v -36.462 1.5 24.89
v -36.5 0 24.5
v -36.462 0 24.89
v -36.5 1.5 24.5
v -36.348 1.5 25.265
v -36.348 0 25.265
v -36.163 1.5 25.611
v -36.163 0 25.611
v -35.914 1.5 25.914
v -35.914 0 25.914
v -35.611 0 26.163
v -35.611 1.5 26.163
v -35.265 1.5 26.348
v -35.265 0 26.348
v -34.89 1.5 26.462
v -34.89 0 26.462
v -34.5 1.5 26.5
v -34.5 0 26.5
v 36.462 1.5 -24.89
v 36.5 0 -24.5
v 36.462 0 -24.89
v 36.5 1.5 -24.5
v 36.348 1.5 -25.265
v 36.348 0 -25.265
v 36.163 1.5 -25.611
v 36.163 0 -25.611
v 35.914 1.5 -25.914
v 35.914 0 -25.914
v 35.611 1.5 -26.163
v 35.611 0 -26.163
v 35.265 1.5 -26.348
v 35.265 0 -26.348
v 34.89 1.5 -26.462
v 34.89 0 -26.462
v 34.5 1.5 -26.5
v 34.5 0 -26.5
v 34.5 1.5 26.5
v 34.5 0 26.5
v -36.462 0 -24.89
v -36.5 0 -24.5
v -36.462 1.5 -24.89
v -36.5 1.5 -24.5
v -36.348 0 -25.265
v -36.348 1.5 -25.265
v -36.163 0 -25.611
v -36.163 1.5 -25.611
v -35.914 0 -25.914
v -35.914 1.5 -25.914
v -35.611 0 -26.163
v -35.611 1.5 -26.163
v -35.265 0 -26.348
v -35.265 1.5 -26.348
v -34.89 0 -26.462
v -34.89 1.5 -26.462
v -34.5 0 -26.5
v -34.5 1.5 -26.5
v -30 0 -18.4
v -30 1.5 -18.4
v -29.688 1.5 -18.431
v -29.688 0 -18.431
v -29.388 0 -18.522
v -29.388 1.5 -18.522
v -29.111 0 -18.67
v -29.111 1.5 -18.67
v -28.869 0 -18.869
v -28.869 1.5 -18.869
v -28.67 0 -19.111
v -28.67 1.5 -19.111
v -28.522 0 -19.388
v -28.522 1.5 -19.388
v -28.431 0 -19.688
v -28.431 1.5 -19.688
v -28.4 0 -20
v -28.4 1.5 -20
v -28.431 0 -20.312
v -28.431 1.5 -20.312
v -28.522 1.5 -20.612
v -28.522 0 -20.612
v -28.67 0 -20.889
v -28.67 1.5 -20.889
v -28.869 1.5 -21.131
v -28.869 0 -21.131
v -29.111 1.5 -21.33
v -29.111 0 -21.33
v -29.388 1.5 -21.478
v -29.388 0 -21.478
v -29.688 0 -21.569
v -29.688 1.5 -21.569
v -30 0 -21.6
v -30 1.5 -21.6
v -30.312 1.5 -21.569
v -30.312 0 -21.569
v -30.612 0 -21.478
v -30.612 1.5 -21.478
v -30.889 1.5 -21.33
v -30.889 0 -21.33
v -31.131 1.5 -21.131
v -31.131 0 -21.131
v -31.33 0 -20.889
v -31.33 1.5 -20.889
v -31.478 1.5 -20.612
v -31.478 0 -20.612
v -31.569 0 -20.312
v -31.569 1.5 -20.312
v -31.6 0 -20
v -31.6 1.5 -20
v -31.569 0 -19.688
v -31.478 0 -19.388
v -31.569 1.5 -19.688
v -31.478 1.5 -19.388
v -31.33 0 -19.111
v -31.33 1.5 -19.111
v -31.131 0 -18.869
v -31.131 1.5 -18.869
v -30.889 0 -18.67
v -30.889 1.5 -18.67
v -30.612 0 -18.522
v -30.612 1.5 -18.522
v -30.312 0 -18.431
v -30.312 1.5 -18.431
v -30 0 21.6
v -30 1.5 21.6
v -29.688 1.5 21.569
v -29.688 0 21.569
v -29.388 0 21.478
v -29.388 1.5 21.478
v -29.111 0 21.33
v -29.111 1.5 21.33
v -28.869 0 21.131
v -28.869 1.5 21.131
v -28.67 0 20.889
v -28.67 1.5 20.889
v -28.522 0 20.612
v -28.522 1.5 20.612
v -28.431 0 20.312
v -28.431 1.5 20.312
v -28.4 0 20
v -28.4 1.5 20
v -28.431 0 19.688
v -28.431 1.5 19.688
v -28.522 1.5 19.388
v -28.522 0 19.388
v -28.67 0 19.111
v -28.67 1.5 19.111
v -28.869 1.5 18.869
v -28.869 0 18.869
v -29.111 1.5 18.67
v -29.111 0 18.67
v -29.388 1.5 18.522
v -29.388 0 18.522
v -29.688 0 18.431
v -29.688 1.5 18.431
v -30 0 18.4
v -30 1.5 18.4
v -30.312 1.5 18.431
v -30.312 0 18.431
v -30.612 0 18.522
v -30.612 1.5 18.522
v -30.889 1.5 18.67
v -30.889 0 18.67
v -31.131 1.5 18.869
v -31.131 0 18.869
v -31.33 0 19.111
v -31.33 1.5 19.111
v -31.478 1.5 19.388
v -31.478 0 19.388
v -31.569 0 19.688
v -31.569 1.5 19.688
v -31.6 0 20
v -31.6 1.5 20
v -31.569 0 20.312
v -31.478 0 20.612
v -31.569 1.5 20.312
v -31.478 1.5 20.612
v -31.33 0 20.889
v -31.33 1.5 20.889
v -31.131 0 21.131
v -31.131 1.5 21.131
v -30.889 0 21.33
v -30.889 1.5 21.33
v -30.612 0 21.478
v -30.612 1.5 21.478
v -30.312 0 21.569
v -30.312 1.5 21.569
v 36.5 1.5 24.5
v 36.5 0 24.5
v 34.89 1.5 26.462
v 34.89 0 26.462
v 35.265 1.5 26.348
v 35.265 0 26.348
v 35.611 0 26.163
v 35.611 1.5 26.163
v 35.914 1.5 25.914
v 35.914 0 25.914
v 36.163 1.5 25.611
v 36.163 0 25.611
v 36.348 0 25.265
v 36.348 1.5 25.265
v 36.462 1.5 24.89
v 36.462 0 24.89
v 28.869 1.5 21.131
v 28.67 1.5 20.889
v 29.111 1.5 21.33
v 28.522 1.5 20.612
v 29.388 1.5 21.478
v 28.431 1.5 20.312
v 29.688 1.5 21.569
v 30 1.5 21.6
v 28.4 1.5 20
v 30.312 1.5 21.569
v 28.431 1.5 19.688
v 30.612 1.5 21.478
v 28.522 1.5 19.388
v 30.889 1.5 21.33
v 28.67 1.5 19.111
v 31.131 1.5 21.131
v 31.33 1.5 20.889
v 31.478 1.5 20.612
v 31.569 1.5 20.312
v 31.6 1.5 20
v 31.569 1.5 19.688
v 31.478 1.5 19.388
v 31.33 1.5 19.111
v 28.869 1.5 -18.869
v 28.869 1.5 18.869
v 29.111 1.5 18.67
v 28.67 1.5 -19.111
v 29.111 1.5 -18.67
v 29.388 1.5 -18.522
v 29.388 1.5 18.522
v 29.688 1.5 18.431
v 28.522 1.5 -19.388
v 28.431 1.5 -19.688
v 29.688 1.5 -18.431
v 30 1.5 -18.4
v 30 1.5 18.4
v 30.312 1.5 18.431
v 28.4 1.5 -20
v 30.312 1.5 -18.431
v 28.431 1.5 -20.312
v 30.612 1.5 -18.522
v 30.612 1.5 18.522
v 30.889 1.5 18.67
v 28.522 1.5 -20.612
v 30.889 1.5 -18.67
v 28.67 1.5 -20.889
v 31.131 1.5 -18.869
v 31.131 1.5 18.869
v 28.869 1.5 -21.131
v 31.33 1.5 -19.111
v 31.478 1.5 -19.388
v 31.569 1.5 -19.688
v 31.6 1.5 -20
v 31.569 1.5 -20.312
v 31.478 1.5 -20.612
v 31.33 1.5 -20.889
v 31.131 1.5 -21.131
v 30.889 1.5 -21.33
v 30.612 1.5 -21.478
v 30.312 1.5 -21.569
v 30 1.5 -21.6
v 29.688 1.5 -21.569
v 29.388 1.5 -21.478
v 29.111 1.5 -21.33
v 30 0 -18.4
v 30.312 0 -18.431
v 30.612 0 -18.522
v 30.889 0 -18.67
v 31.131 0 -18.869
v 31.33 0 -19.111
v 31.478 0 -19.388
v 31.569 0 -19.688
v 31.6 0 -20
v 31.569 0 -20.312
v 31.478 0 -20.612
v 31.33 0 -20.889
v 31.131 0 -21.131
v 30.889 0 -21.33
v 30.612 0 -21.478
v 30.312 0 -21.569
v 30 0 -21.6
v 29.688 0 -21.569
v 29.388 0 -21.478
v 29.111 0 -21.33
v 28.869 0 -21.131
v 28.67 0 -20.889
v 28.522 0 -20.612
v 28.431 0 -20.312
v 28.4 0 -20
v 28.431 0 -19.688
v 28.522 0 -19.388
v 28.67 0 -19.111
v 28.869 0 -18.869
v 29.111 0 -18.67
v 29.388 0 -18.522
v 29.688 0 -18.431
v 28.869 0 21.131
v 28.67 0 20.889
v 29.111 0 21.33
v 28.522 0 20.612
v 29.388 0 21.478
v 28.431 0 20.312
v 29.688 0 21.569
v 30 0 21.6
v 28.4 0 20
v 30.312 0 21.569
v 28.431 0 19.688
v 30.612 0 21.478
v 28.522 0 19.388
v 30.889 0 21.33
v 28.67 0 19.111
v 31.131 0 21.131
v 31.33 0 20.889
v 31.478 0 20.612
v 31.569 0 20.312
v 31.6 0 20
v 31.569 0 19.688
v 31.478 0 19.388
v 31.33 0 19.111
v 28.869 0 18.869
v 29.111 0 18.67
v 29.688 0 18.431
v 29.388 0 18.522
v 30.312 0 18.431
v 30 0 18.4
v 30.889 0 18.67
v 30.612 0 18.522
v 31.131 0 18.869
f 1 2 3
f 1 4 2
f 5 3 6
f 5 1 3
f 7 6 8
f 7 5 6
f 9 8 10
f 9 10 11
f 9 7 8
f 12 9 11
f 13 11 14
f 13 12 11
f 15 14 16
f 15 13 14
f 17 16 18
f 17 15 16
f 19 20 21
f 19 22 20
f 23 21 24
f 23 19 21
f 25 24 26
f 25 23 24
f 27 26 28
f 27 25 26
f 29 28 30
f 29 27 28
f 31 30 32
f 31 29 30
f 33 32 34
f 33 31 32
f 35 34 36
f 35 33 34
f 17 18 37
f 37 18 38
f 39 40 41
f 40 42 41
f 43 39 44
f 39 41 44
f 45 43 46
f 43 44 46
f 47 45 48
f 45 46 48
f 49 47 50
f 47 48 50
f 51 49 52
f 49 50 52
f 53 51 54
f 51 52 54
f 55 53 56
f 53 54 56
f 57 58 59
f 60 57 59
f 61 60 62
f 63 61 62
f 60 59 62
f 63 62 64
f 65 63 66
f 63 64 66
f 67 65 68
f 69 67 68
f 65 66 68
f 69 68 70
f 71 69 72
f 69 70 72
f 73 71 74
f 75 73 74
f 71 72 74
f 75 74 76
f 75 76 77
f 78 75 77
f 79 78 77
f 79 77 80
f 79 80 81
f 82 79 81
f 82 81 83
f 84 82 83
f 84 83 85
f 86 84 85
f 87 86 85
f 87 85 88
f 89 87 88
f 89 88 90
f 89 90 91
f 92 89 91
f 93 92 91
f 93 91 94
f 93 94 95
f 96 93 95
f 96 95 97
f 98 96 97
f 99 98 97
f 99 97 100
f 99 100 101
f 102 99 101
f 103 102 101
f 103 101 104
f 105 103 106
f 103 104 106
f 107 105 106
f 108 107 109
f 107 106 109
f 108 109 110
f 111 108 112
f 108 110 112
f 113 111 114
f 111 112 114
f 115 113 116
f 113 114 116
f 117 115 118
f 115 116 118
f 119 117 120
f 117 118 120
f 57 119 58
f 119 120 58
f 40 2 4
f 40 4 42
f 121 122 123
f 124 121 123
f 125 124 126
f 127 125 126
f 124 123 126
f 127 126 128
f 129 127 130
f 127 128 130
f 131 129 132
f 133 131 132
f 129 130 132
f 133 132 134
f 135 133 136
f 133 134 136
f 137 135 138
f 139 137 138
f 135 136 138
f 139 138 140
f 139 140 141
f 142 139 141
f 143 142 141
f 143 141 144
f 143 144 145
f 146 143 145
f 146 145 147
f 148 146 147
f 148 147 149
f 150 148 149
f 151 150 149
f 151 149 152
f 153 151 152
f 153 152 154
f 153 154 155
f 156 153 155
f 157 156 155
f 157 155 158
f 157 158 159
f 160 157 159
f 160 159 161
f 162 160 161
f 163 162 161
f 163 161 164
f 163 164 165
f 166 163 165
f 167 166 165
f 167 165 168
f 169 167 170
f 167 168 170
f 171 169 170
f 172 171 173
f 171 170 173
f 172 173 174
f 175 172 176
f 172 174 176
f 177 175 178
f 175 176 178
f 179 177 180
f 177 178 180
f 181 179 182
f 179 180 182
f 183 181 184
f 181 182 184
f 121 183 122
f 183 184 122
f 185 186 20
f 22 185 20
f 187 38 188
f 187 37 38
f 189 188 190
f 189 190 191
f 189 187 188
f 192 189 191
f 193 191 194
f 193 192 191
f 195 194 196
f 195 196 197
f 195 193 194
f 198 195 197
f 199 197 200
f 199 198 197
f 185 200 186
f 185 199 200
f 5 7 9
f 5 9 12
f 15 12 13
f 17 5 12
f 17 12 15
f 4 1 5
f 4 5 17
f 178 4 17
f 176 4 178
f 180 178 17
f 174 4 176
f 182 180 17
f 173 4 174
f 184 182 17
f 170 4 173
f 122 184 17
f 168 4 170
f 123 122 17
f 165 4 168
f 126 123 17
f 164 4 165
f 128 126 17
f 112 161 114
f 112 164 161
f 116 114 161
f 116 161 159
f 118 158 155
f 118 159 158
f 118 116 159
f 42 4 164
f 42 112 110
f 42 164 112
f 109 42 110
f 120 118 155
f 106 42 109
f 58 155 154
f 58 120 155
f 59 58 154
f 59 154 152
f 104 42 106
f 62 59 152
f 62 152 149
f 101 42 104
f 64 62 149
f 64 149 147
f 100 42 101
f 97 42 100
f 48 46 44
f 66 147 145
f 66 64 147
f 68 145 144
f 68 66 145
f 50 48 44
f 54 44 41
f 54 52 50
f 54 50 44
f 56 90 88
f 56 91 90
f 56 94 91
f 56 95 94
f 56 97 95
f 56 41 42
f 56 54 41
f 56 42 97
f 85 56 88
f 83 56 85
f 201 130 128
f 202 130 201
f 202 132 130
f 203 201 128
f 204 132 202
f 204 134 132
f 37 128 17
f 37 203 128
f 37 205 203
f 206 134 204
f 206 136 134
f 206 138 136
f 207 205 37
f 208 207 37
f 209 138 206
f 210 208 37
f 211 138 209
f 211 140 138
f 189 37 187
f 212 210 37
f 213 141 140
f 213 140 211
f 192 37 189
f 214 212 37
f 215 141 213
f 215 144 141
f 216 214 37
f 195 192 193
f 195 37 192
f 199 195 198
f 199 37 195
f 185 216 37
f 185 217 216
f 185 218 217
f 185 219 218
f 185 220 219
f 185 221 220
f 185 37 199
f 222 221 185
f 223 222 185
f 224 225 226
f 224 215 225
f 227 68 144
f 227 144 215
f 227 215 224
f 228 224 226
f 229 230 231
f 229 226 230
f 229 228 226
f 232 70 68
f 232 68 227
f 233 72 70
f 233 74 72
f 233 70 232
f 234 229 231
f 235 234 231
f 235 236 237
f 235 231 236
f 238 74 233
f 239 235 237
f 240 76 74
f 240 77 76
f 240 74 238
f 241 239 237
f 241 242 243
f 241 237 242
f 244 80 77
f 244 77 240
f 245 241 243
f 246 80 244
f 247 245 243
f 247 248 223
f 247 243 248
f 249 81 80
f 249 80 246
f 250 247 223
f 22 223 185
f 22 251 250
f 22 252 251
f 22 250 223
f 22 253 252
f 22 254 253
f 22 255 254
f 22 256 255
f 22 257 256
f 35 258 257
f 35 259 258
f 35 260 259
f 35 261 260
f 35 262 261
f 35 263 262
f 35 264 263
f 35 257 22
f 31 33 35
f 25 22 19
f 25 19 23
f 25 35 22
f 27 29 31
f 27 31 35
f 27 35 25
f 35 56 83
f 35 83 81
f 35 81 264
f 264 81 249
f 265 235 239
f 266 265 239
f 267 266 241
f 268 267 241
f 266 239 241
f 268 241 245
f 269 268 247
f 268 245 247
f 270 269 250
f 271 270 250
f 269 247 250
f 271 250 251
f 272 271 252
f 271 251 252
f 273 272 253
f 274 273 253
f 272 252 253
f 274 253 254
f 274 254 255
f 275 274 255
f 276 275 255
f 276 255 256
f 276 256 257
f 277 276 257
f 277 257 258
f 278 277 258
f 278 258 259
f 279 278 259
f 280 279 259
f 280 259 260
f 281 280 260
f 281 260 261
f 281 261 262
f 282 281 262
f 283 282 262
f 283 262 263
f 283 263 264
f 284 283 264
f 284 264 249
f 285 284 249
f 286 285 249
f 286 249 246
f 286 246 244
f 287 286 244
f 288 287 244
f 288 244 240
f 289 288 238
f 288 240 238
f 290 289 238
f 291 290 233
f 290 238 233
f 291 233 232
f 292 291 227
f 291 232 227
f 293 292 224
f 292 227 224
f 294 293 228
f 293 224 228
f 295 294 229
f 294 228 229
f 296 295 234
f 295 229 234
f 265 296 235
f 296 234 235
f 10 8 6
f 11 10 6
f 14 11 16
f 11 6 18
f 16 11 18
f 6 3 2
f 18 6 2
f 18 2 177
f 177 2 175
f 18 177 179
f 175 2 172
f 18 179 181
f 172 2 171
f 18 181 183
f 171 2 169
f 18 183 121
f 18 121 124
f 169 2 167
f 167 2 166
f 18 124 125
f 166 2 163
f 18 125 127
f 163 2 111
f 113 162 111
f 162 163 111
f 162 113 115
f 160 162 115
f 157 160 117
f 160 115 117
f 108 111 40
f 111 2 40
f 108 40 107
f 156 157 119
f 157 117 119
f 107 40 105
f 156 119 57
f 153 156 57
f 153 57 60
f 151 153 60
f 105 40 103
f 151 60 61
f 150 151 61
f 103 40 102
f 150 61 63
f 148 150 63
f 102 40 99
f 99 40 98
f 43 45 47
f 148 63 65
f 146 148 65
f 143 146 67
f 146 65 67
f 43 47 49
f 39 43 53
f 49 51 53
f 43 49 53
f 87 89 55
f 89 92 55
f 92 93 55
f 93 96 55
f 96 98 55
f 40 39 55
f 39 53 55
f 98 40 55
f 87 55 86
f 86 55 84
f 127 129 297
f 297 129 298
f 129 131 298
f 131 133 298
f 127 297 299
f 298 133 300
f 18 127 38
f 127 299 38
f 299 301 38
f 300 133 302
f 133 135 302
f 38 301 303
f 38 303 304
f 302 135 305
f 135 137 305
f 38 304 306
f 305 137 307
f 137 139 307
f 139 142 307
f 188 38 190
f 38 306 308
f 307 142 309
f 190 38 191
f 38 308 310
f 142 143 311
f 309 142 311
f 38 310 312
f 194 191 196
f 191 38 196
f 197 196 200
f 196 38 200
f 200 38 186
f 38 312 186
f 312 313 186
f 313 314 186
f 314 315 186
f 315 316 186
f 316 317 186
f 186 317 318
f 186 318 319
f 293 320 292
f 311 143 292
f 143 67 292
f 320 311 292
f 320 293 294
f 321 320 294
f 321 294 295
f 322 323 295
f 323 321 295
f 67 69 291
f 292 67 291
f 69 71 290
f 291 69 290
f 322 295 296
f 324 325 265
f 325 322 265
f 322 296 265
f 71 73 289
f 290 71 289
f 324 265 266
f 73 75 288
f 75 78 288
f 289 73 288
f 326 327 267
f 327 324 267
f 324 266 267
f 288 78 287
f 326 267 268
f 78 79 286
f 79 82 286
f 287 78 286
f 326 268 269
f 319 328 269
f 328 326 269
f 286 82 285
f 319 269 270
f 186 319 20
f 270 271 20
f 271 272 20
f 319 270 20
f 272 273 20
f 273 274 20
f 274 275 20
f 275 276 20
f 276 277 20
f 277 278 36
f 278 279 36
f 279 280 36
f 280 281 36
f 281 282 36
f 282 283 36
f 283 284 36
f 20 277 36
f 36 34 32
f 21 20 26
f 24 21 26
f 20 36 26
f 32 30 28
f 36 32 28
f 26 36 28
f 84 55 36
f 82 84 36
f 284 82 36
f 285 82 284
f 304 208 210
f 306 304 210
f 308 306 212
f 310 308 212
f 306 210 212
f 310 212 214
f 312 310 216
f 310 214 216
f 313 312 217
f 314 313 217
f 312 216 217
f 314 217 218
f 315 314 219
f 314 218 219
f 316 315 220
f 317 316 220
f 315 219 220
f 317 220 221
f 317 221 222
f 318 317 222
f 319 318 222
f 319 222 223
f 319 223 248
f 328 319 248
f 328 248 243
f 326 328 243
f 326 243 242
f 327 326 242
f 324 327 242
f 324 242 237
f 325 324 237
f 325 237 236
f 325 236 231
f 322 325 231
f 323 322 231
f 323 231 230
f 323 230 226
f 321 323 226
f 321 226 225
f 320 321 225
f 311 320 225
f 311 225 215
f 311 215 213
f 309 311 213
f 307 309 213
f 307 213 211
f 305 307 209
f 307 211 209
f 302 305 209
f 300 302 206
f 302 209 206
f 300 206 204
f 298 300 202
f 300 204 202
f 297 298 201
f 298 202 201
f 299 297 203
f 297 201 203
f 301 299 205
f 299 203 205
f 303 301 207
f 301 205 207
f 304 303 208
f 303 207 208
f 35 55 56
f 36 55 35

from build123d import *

# Parameters (mm, degrees)
SKETCH_1_W                  = 73
SKETCH_1_H                  = 53
EXTRUDE_1_DEPTH             = 1.5
FILLET_1_R                  = 2
SKETCH_2_R                  = 1.6
CUT_EXTRUDE_1_DEPTH         = 46.130366717
PATTERN_LINEAR_1_COUNT      = 2
PATTERN_LINEAR_1_PITCH      = 60
PATTERN_LINEAR_1_COUNT_DIR2 = 2
PATTERN_LINEAR_1_PITCH_DIR2 = 40


with BuildPart() as part:
    # 草图1 → 凸台-拉伸1 (new body)
    with BuildSketch(Plane(origin=(0, 0, 0), x_dir=(1, 0, 0), z_dir=(0, 1, 0))):
        Rectangle(SKETCH_1_W, SKETCH_1_H)
    extrude(amount=EXTRUDE_1_DEPTH)

    # 圆角1
    fillet_1_edges = [part.edges().sort_by_distance(p)[0] for p in [
        (-36.5, 0.75, -26.5),
        (36.5, 0.75, -26.5),
        (36.5, 0.75, 26.5),
        (-36.5, 0.75, 26.5),
    ]]
    fillet(fillet_1_edges, radius=FILLET_1_R)

    # 草图2 → 切除-拉伸1 (cut, through all)
    with BuildSketch(Plane(origin=(0, 1.5, 0), x_dir=(1, 0, 0), z_dir=(0, 1, 0))):
        with Locations(Location((-30, 20, 0), (0, 0, 270))):
            Circle(SKETCH_2_R)
    cut_extrude_1 = extrude(amount=-CUT_EXTRUDE_1_DEPTH, mode=Mode.SUBTRACT)

    # 阵列(线性)1: Cut-Extrude 1 2 × 2
    with Locations(*[(i * PATTERN_LINEAR_1_PITCH, 0, j * PATTERN_LINEAR_1_PITCH_DIR2) for i in range(PATTERN_LINEAR_1_COUNT) for j in range(PATTERN_LINEAR_1_COUNT_DIR2) if (i, j) != (0, 0)]):
        add(cut_extrude_1, mode=Mode.SUBTRACT)


solid = part.part
